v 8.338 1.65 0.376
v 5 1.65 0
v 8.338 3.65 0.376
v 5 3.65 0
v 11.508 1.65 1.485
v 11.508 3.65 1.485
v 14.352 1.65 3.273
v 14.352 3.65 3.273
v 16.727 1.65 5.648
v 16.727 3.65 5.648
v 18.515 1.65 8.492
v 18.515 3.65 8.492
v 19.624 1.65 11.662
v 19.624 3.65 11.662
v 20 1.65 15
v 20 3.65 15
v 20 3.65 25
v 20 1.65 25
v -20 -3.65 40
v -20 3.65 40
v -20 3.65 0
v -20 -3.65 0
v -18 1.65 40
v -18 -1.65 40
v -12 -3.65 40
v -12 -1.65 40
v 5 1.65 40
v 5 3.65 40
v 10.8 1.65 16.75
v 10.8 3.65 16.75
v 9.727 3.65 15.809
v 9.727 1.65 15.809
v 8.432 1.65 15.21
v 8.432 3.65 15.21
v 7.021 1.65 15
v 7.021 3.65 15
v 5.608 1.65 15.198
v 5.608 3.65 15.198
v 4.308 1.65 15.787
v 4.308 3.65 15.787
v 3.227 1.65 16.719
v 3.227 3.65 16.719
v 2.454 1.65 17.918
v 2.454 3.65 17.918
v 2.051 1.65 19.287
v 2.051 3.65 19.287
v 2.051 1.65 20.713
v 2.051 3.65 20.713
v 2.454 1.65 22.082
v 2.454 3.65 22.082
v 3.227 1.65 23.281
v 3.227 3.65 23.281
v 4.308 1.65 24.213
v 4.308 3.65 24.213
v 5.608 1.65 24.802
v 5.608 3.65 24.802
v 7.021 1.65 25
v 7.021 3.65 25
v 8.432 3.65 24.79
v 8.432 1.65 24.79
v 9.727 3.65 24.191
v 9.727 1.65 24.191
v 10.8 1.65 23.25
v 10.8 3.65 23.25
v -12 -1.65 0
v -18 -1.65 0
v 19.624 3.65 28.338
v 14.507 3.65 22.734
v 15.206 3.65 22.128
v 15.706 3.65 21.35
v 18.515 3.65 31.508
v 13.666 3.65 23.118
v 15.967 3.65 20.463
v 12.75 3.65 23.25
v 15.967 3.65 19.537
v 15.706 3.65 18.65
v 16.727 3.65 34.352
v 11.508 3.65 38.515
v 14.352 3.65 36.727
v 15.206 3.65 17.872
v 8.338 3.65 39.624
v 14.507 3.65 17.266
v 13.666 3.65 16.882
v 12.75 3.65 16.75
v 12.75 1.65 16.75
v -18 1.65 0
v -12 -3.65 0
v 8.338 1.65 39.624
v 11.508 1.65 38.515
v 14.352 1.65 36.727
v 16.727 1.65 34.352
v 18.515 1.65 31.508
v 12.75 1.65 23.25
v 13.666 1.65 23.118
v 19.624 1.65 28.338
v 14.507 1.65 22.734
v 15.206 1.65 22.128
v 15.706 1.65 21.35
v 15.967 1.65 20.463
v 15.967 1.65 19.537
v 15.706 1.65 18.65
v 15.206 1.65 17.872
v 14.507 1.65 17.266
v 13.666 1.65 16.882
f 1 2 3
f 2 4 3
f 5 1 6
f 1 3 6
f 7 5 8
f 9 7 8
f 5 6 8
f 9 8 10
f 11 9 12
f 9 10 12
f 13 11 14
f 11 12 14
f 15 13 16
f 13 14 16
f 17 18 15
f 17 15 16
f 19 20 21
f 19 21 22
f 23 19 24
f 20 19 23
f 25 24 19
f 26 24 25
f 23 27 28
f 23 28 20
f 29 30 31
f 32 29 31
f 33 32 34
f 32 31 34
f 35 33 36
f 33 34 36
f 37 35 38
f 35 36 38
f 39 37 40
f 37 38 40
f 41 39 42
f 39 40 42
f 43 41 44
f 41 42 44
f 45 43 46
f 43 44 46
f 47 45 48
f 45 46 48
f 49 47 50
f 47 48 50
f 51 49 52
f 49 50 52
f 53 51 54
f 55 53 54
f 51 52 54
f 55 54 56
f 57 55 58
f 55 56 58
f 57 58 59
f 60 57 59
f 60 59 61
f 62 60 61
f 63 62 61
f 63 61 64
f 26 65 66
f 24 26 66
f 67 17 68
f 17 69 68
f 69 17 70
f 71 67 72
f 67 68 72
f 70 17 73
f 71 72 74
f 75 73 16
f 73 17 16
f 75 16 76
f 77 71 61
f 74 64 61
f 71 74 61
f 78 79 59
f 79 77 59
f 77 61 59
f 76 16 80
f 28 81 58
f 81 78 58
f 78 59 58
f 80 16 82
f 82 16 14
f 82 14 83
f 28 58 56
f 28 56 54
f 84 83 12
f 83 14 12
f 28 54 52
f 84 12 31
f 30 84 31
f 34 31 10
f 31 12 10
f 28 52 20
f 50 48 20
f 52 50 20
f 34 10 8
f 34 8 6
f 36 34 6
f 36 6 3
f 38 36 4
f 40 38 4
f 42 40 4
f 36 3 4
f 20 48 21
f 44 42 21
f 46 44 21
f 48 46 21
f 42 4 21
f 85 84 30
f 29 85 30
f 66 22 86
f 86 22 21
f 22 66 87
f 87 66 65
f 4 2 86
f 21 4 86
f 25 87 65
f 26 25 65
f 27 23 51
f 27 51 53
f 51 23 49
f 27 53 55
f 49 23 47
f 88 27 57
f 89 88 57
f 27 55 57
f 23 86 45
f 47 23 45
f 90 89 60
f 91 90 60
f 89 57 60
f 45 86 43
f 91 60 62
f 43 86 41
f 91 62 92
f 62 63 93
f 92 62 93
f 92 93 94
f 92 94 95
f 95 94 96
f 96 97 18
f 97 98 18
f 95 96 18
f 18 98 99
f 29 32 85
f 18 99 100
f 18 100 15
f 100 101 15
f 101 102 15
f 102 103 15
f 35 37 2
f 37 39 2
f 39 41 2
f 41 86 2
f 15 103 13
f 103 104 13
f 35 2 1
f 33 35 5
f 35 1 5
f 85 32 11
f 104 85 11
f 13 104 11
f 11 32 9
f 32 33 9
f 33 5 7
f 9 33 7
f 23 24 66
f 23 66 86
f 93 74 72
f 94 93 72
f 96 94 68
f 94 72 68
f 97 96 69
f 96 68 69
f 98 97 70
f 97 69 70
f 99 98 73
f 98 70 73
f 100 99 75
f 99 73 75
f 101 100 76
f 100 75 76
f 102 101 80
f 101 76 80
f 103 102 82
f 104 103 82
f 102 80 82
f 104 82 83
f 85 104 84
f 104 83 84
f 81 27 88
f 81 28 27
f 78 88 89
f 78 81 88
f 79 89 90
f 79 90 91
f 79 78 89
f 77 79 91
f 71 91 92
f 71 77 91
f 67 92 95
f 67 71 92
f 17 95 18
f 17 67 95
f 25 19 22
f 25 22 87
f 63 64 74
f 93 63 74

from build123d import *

# Parameters (mm, degrees)
F1_DEPTH = 40
F3_DEPTH = 2
F4_R     = 15


with BuildPart() as f1:
    # F0 (on Top) → F1 (new body)
    with BuildSketch(Plane.XY):
        Polygon((-20, -3.65), (-12, -3.65), (-12, -1.65), (-18, -1.65), (-18, 1.65), (20, 1.65), (20, 3.65), (-20, 3.65), align=None)
    extrude(amount=F1_DEPTH)

    # F2 (on face) → F3 (cut, through all)
    with BuildSketch(Plane(origin=(0, 3.65, 0), x_dir=(-1, 0, 0), z_dir=(0, 1, 0))):
        with BuildLine():
            Line((-12.75, 16.75), (-10.799671, 16.75))
            Line((-10.799671, 16.75), (-7, 16.75))
            Line((-7, 16.75), (-7, 23.25))
            Line((-7, 23.25), (-10.799671, 23.25))
            Line((-10.799671, 23.25), (-12.75, 23.25))
            ThreePointArc((-12.75, 23.25), (-16, 20), (-12.75, 16.75))
        make_face()
        with BuildLine():
            Line((-7, 16.75), (-10.799671, 16.75))
            ThreePointArc((-10.799671, 16.75), (-2, 20), (-10.799671, 23.25))
            Line((-10.799671, 23.25), (-7, 23.25))
            Line((-7, 23.25), (-7, 16.75))
        make_face()
    extrude(amount=-F3_DEPTH, mode=Mode.SUBTRACT)

    # F4
    f4_edges = [f1.edges().sort_by_distance(p)[0] for p in [
        (20, 2.65, 40),
        (20, 2.65, 0),
    ]]
    fillet(f4_edges, radius=F4_R)


solid = f1.part
